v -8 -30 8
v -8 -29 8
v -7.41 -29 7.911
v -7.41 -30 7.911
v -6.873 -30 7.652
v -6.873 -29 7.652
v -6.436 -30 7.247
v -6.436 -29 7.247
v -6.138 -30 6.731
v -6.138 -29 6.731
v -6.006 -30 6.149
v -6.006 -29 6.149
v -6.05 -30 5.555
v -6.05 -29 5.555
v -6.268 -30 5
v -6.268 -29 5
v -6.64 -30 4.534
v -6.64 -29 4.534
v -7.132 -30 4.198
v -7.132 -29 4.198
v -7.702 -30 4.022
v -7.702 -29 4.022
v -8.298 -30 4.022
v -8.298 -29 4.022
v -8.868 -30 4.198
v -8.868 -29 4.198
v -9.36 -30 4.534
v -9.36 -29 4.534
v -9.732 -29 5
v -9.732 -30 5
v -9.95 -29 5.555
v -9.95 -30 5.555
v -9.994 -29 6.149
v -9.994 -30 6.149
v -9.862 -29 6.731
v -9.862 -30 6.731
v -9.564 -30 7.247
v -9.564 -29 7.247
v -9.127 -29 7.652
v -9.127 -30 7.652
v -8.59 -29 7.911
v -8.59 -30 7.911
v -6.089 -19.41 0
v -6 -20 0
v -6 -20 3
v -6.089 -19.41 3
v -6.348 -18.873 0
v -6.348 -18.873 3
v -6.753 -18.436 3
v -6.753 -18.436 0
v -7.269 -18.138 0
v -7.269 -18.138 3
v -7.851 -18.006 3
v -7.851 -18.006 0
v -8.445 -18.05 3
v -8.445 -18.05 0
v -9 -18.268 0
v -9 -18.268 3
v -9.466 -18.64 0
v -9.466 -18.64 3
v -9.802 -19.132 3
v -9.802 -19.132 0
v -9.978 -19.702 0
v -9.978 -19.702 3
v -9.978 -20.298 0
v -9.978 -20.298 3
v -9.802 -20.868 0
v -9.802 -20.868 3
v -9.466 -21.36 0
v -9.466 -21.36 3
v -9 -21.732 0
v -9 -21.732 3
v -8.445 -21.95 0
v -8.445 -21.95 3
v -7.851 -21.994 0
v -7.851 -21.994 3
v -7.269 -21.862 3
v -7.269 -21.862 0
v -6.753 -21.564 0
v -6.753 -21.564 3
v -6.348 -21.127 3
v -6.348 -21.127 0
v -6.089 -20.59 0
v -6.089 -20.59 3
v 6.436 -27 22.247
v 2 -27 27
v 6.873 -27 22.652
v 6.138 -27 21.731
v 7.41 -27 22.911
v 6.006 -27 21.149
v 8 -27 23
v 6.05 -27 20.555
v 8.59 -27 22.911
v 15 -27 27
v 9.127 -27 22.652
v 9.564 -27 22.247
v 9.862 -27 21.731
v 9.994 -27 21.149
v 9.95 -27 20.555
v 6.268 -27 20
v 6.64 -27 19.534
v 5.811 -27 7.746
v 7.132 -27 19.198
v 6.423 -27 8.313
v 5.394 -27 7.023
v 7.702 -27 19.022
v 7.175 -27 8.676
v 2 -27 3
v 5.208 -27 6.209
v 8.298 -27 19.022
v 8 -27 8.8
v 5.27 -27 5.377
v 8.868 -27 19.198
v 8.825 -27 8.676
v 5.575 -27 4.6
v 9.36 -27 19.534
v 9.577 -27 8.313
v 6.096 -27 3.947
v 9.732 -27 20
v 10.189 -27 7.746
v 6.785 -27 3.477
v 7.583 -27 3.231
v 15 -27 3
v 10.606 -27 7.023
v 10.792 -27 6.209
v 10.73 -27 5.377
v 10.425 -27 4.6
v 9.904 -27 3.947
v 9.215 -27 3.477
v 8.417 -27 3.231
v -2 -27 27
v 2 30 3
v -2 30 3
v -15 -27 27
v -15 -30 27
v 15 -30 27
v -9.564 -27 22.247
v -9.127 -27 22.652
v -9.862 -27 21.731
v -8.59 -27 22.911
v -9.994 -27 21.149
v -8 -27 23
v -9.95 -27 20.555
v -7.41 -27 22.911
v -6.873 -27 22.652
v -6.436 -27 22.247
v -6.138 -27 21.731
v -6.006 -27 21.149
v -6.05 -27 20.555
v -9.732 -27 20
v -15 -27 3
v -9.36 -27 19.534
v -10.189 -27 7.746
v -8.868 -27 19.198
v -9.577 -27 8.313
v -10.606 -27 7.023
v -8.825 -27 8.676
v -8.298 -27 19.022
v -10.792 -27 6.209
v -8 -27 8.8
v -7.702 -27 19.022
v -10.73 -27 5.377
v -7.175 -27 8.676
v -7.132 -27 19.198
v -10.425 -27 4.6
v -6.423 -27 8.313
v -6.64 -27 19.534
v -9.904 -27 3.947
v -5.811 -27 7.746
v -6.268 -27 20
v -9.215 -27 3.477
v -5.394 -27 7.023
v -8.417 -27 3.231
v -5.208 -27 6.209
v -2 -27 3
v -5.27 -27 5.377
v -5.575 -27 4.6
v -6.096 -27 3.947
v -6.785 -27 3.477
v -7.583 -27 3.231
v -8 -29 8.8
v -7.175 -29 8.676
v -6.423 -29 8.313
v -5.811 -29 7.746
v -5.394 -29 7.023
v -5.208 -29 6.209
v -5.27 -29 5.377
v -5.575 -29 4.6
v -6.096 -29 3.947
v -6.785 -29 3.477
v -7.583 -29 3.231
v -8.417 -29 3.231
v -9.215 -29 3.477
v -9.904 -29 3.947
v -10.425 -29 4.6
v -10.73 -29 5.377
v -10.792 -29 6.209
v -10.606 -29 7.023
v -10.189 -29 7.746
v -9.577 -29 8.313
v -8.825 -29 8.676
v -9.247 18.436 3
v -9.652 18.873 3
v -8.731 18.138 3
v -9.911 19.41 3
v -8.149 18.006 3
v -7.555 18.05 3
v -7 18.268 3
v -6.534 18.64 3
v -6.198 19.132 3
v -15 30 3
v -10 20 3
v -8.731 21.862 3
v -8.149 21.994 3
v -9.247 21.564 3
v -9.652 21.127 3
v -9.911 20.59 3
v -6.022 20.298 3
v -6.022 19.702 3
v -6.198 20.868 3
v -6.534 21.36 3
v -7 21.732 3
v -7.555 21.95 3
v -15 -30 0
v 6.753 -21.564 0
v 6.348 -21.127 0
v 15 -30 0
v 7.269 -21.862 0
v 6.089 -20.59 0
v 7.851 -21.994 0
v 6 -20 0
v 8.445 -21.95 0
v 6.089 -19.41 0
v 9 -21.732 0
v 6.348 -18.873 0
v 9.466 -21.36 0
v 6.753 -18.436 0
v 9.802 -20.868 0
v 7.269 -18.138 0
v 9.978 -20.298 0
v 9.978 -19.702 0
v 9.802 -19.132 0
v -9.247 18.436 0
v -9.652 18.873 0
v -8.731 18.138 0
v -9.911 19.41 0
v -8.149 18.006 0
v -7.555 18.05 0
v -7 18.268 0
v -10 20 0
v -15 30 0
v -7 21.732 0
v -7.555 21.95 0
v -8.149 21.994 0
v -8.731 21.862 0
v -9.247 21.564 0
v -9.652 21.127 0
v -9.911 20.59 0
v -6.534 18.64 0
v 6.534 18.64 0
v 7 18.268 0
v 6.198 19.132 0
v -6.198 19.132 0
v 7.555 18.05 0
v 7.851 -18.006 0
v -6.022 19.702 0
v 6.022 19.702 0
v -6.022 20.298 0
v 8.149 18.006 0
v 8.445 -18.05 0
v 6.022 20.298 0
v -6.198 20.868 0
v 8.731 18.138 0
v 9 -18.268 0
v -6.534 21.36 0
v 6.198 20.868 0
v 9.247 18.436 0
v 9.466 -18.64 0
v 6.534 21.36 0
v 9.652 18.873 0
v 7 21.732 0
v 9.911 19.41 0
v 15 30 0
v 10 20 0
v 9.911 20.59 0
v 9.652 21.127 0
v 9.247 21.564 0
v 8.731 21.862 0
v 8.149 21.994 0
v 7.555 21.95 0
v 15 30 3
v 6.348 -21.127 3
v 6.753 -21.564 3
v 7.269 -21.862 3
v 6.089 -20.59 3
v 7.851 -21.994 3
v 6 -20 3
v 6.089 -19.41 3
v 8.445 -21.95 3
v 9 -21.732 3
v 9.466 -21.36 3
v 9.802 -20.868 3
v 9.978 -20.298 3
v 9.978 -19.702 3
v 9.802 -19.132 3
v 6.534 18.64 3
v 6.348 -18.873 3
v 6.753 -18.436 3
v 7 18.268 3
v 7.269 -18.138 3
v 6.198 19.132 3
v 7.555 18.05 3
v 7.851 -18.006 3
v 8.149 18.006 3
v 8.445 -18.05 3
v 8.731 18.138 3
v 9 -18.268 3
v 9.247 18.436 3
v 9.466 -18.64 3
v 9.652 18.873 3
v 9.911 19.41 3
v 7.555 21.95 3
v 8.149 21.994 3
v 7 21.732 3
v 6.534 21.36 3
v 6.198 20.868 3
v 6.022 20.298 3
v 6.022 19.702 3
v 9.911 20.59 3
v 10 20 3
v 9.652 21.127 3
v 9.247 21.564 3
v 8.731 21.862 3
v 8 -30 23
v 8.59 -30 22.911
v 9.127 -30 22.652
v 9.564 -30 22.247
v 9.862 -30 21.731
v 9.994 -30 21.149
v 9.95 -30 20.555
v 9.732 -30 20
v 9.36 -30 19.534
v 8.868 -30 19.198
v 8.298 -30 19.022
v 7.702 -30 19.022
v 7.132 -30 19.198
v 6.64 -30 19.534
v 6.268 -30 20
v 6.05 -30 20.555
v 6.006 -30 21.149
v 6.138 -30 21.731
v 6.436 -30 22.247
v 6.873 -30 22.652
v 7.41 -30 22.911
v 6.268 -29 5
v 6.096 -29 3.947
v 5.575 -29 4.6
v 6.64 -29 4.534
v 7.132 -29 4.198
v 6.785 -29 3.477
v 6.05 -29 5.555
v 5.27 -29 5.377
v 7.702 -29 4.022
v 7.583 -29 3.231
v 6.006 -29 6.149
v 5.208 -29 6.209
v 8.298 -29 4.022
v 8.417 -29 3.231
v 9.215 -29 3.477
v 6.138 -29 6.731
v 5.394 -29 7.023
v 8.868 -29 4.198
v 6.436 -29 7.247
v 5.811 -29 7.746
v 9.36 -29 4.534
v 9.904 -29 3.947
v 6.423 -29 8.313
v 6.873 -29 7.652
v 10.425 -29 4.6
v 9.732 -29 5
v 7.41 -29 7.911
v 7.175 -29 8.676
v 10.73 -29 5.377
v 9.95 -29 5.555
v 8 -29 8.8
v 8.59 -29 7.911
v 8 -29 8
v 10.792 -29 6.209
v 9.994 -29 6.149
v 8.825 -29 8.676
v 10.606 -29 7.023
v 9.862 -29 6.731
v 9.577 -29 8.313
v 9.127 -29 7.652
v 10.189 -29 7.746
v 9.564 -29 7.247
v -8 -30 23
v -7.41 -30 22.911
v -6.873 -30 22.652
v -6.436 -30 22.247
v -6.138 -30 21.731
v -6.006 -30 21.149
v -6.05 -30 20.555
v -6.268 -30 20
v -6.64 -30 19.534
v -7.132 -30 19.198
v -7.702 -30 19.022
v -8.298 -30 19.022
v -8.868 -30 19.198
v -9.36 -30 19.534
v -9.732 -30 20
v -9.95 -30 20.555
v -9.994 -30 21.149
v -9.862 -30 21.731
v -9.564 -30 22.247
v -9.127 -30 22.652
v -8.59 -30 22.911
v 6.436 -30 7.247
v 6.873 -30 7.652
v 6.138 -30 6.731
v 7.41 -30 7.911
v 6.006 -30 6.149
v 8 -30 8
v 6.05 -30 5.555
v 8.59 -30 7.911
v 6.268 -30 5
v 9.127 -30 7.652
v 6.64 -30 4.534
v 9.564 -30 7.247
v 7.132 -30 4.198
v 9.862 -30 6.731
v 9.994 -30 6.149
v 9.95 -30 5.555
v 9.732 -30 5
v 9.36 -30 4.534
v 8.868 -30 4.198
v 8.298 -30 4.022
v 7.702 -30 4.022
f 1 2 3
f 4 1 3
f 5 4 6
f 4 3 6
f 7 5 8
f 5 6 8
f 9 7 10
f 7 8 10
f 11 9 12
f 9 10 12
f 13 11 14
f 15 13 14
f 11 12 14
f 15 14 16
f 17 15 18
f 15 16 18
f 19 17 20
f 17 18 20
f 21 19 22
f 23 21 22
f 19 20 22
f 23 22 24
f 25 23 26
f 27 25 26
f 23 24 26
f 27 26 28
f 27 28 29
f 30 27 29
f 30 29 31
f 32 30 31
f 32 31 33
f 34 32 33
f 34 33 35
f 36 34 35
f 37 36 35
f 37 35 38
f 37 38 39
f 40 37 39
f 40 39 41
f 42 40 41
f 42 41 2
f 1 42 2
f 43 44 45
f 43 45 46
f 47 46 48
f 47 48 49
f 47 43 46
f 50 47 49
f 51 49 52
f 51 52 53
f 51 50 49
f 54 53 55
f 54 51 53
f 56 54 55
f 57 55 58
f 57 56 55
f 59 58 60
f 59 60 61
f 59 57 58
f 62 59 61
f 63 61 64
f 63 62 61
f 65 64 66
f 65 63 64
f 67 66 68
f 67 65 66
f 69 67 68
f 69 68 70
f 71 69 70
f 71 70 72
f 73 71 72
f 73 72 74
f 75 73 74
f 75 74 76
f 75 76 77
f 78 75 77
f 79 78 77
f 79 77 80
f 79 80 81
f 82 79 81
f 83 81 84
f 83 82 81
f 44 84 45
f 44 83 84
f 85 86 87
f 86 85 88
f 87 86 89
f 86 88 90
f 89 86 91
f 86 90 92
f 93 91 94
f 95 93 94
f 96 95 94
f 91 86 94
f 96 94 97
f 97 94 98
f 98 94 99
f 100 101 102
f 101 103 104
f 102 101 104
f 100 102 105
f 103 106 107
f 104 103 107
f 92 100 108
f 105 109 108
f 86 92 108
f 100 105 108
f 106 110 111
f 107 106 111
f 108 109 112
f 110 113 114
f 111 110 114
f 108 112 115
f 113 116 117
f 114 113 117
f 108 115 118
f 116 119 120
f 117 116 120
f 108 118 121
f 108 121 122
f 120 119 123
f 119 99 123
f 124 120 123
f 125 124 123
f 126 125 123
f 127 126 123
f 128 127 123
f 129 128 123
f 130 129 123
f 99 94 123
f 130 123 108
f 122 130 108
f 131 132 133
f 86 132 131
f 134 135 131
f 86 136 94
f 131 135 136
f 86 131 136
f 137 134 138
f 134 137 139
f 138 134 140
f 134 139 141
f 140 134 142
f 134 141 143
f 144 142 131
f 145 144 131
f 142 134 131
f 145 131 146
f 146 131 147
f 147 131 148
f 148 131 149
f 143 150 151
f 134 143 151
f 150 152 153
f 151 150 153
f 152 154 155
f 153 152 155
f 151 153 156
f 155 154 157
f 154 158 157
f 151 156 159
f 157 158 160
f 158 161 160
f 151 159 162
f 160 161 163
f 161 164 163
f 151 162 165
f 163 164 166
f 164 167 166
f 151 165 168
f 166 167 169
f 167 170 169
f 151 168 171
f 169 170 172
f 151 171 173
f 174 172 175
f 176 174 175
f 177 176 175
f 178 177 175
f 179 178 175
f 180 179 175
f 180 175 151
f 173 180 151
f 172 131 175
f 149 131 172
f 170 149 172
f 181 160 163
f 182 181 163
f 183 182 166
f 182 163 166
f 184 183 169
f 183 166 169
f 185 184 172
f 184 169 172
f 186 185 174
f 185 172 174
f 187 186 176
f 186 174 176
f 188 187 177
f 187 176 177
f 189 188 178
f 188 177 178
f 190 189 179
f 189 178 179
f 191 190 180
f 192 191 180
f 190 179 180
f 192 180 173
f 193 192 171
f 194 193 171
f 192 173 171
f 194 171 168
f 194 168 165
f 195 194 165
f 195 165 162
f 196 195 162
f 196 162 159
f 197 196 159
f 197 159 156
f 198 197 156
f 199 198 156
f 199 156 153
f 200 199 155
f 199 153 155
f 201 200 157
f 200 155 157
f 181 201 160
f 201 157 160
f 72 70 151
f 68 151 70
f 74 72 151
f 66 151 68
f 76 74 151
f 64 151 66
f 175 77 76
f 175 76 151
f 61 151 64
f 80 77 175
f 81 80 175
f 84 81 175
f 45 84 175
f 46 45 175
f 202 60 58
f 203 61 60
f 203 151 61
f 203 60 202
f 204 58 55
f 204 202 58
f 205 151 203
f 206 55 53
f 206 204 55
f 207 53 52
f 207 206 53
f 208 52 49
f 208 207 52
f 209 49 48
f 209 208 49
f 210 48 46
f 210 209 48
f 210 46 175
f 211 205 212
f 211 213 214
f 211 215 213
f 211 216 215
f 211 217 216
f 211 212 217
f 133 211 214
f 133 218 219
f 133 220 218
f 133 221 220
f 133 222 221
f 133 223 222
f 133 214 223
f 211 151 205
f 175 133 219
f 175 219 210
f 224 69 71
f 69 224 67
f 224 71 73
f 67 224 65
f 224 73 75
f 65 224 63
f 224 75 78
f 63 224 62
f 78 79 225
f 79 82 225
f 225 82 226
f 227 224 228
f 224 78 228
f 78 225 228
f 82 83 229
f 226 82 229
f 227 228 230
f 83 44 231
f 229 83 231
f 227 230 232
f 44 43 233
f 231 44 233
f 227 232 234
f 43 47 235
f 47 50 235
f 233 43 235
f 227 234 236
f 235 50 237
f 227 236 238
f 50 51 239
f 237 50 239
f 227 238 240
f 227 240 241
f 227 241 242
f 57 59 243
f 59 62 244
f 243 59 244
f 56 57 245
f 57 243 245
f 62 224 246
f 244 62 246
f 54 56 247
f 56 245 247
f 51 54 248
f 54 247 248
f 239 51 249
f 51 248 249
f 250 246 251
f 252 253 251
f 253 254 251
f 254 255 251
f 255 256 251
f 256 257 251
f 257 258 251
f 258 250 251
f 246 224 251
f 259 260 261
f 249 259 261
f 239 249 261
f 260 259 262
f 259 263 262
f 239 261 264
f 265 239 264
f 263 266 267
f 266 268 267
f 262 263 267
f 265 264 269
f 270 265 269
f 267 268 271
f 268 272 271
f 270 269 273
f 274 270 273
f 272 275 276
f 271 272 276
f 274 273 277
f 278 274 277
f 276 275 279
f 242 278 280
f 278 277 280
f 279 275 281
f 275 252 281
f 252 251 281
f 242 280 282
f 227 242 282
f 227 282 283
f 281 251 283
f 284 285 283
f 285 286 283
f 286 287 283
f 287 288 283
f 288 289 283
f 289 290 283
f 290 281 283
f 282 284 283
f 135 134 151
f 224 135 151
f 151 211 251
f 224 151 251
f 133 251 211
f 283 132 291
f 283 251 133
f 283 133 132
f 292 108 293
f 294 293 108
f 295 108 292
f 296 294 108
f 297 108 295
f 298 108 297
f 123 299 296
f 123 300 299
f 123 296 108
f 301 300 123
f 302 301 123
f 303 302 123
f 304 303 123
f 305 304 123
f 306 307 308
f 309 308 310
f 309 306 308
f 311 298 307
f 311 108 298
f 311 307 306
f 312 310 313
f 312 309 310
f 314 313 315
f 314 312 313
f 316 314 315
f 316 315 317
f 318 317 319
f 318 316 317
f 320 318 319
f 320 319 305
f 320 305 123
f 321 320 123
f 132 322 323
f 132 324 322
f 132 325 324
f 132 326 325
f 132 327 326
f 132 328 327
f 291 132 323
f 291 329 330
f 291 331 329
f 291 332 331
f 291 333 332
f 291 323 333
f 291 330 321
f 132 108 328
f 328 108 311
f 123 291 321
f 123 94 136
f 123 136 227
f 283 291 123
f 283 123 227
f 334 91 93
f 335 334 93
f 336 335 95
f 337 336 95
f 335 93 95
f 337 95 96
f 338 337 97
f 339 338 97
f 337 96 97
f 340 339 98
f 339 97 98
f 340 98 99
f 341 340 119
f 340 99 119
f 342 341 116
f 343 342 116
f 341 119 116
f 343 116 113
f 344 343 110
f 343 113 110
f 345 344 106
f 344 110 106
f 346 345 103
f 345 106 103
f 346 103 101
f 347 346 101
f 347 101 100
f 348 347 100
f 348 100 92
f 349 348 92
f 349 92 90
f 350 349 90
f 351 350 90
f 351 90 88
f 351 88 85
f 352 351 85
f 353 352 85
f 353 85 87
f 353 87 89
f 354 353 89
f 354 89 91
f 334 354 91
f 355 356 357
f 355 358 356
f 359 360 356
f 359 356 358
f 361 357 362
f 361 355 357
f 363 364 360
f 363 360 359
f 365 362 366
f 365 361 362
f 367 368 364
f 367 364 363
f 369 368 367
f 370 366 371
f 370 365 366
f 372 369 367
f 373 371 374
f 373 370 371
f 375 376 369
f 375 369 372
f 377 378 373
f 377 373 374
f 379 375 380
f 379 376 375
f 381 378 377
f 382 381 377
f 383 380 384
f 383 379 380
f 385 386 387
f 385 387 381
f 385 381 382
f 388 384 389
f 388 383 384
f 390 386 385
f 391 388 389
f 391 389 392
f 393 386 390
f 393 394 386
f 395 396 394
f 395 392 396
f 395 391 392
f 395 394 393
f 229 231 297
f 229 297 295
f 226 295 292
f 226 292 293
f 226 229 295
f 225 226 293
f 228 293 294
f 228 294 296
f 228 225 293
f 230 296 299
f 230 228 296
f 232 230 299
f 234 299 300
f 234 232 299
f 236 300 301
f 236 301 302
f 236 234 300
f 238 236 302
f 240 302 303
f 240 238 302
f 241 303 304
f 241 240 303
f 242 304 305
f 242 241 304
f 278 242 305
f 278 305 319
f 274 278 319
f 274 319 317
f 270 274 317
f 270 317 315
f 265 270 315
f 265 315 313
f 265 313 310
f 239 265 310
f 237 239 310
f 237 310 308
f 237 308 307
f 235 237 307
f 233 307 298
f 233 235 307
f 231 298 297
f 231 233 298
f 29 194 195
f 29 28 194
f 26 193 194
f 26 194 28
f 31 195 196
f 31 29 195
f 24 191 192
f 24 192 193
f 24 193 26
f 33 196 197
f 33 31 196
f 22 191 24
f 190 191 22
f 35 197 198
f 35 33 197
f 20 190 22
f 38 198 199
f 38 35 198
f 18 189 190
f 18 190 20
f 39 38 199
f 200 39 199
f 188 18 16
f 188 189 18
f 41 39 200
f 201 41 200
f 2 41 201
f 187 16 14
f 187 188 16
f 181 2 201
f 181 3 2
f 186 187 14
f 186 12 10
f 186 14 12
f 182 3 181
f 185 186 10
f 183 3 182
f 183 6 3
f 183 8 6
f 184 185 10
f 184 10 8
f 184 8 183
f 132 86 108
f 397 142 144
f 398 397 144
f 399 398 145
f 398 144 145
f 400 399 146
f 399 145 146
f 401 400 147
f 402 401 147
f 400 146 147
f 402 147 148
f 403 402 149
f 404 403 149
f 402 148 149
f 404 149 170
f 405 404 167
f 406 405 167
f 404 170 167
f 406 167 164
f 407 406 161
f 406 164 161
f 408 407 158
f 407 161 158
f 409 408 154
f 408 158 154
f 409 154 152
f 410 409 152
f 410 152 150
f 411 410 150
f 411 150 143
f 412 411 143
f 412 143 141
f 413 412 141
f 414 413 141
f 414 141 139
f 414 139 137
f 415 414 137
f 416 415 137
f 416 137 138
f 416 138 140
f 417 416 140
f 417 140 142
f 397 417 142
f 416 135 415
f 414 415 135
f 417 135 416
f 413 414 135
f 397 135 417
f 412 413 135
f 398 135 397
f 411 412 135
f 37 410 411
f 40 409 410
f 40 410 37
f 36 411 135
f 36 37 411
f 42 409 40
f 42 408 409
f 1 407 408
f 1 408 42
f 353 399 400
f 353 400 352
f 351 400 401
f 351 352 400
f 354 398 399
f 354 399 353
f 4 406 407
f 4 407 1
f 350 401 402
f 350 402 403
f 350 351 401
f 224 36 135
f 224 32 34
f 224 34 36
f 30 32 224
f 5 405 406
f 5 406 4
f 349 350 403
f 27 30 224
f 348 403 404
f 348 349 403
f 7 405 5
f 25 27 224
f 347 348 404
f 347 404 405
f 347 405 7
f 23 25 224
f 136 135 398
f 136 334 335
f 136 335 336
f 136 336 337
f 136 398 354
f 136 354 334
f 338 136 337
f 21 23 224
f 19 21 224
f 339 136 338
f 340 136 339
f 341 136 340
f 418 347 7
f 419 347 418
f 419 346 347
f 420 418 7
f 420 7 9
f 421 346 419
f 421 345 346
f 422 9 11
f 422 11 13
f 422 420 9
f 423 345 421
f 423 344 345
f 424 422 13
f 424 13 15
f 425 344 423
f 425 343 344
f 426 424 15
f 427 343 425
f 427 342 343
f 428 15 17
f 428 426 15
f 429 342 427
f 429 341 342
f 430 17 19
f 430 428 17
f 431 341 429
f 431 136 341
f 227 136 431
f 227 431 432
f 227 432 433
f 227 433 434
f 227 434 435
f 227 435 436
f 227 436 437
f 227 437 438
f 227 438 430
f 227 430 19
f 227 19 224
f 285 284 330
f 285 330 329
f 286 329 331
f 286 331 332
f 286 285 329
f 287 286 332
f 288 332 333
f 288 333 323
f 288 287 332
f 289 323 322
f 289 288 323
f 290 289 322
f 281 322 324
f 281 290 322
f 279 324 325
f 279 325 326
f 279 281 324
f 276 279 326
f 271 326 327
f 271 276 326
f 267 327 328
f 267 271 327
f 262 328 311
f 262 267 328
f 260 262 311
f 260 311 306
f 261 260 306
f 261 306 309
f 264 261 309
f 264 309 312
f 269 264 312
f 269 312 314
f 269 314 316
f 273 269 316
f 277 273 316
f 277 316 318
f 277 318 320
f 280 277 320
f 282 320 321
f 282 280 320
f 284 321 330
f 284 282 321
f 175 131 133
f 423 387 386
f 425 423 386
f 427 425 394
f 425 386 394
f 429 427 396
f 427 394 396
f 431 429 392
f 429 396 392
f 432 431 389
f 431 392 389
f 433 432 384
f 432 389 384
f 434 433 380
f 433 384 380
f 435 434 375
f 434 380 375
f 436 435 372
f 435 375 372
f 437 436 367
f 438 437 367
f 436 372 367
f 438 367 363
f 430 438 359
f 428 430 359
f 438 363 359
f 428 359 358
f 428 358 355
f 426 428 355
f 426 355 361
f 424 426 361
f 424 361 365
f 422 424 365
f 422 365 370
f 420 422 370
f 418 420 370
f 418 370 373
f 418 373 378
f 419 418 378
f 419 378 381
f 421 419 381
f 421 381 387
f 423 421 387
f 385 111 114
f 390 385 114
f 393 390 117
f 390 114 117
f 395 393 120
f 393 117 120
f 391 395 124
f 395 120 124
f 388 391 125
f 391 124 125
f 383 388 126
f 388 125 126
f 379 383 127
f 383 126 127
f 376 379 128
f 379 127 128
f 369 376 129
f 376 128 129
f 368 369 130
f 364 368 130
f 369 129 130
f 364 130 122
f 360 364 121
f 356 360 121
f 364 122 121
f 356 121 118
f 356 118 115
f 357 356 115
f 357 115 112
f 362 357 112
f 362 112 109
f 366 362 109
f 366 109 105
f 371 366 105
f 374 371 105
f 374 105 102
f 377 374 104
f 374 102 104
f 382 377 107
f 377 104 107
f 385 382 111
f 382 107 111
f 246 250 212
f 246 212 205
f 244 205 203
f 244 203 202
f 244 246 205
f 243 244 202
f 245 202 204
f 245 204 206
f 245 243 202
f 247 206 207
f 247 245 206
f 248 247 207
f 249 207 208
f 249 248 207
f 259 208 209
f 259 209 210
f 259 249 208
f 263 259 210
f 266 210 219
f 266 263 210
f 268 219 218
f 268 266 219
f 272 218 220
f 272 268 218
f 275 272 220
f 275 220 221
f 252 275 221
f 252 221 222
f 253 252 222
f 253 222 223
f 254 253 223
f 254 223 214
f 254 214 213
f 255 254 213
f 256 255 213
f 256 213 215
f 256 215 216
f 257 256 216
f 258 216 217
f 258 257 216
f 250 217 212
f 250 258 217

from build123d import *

# Parameters (mm, degrees)
SKETCH1_W           = 30
SKETCH1_H           = 60
SKETCH1_R           = 2
BOSS_EXTRUDE1_DEPTH = 3
SKETCH2_W           = 24
SKETCH2_H           = 3
BOSS_EXTRUDE2_DEPTH = 15
SKETCH3_R           = 2
CUT_EXTRUDE1_DEPTH  = 65.830548355
BOSS_EXTRUDE3_DEPTH = 2
SKETCH4_R           = 2.8
CUT_EXTRUDE2_DEPTH  = 2


with BuildPart() as part:
    # Sketch1 → Boss-Extrude1 (new body)
    with BuildSketch(Plane.XY):
        Rectangle(SKETCH1_W, SKETCH1_H)
        with Locations((8, 20)):
            Circle(SKETCH1_R, mode=Mode.SUBTRACT)
        with Locations(Location((8, -20, 0), (0, 0, 180))):
            Circle(SKETCH1_R, mode=Mode.SUBTRACT)
        with Locations(Location((-8, 20, 0), (0, 0, 180))):
            Circle(SKETCH1_R, mode=Mode.SUBTRACT)
        with Locations((-8, -20)):
            Circle(SKETCH1_R, mode=Mode.SUBTRACT)
    extrude(amount=BOSS_EXTRUDE1_DEPTH)

    # Sketch2 → Boss-Extrude2 (add, symmetric)
    with BuildSketch(Plane(origin=(0, 0, 0), x_dir=(0, 0, -1), z_dir=(1, 0, 0))):
        with Locations((-15, -28.5)):
            Rectangle(SKETCH2_W, SKETCH2_H)
    extrude(amount=BOSS_EXTRUDE2_DEPTH, both=True)

    # Sketch3 → Cut-Extrude1 (cut, through all)
    with BuildSketch(Plane(origin=(0, -27, 0), x_dir=(1, 0, 0), z_dir=(0, 1, 0))):
        with Locations(Location((-8, -6, 0), (0, 0, 270))):
            Circle(SKETCH3_R)
        with Locations(Location((8, -6, 0), (0, 0, 270))):
            Circle(SKETCH3_R)
        with Locations(Location((-8, -21, 0), (0, 0, 270))):
            Circle(SKETCH3_R)
        with Locations(Location((8, -21, 0), (0, 0, 270))):
            Circle(SKETCH3_R)
    extrude(amount=-CUT_EXTRUDE1_DEPTH, mode=Mode.SUBTRACT)

    # Sketch6 → Boss-Extrude3 (add, symmetric)
    with BuildSketch(Plane(origin=(0, 0, 0), x_dir=(0, 0, -1), z_dir=(1, 0, 0))):
        Polygon((-3, 30), (-27, -27), (-3, -27), align=None)
    extrude(amount=BOSS_EXTRUDE3_DEPTH, both=True)

    # Sketch4 → Cut-Extrude2 (cut)
    with BuildSketch(Plane(origin=(0, -27, 0), x_dir=(1, 0, 0), z_dir=(0, 1, 0))):
        with Locations(Location((-8, -6, 0), (0, 0, 270))):
            Circle(SKETCH4_R)
        with Locations(Location((8, -6, 0), (0, 0, 270))):
            Circle(SKETCH4_R)
    extrude(amount=-CUT_EXTRUDE2_DEPTH, mode=Mode.SUBTRACT)


solid = part.part
